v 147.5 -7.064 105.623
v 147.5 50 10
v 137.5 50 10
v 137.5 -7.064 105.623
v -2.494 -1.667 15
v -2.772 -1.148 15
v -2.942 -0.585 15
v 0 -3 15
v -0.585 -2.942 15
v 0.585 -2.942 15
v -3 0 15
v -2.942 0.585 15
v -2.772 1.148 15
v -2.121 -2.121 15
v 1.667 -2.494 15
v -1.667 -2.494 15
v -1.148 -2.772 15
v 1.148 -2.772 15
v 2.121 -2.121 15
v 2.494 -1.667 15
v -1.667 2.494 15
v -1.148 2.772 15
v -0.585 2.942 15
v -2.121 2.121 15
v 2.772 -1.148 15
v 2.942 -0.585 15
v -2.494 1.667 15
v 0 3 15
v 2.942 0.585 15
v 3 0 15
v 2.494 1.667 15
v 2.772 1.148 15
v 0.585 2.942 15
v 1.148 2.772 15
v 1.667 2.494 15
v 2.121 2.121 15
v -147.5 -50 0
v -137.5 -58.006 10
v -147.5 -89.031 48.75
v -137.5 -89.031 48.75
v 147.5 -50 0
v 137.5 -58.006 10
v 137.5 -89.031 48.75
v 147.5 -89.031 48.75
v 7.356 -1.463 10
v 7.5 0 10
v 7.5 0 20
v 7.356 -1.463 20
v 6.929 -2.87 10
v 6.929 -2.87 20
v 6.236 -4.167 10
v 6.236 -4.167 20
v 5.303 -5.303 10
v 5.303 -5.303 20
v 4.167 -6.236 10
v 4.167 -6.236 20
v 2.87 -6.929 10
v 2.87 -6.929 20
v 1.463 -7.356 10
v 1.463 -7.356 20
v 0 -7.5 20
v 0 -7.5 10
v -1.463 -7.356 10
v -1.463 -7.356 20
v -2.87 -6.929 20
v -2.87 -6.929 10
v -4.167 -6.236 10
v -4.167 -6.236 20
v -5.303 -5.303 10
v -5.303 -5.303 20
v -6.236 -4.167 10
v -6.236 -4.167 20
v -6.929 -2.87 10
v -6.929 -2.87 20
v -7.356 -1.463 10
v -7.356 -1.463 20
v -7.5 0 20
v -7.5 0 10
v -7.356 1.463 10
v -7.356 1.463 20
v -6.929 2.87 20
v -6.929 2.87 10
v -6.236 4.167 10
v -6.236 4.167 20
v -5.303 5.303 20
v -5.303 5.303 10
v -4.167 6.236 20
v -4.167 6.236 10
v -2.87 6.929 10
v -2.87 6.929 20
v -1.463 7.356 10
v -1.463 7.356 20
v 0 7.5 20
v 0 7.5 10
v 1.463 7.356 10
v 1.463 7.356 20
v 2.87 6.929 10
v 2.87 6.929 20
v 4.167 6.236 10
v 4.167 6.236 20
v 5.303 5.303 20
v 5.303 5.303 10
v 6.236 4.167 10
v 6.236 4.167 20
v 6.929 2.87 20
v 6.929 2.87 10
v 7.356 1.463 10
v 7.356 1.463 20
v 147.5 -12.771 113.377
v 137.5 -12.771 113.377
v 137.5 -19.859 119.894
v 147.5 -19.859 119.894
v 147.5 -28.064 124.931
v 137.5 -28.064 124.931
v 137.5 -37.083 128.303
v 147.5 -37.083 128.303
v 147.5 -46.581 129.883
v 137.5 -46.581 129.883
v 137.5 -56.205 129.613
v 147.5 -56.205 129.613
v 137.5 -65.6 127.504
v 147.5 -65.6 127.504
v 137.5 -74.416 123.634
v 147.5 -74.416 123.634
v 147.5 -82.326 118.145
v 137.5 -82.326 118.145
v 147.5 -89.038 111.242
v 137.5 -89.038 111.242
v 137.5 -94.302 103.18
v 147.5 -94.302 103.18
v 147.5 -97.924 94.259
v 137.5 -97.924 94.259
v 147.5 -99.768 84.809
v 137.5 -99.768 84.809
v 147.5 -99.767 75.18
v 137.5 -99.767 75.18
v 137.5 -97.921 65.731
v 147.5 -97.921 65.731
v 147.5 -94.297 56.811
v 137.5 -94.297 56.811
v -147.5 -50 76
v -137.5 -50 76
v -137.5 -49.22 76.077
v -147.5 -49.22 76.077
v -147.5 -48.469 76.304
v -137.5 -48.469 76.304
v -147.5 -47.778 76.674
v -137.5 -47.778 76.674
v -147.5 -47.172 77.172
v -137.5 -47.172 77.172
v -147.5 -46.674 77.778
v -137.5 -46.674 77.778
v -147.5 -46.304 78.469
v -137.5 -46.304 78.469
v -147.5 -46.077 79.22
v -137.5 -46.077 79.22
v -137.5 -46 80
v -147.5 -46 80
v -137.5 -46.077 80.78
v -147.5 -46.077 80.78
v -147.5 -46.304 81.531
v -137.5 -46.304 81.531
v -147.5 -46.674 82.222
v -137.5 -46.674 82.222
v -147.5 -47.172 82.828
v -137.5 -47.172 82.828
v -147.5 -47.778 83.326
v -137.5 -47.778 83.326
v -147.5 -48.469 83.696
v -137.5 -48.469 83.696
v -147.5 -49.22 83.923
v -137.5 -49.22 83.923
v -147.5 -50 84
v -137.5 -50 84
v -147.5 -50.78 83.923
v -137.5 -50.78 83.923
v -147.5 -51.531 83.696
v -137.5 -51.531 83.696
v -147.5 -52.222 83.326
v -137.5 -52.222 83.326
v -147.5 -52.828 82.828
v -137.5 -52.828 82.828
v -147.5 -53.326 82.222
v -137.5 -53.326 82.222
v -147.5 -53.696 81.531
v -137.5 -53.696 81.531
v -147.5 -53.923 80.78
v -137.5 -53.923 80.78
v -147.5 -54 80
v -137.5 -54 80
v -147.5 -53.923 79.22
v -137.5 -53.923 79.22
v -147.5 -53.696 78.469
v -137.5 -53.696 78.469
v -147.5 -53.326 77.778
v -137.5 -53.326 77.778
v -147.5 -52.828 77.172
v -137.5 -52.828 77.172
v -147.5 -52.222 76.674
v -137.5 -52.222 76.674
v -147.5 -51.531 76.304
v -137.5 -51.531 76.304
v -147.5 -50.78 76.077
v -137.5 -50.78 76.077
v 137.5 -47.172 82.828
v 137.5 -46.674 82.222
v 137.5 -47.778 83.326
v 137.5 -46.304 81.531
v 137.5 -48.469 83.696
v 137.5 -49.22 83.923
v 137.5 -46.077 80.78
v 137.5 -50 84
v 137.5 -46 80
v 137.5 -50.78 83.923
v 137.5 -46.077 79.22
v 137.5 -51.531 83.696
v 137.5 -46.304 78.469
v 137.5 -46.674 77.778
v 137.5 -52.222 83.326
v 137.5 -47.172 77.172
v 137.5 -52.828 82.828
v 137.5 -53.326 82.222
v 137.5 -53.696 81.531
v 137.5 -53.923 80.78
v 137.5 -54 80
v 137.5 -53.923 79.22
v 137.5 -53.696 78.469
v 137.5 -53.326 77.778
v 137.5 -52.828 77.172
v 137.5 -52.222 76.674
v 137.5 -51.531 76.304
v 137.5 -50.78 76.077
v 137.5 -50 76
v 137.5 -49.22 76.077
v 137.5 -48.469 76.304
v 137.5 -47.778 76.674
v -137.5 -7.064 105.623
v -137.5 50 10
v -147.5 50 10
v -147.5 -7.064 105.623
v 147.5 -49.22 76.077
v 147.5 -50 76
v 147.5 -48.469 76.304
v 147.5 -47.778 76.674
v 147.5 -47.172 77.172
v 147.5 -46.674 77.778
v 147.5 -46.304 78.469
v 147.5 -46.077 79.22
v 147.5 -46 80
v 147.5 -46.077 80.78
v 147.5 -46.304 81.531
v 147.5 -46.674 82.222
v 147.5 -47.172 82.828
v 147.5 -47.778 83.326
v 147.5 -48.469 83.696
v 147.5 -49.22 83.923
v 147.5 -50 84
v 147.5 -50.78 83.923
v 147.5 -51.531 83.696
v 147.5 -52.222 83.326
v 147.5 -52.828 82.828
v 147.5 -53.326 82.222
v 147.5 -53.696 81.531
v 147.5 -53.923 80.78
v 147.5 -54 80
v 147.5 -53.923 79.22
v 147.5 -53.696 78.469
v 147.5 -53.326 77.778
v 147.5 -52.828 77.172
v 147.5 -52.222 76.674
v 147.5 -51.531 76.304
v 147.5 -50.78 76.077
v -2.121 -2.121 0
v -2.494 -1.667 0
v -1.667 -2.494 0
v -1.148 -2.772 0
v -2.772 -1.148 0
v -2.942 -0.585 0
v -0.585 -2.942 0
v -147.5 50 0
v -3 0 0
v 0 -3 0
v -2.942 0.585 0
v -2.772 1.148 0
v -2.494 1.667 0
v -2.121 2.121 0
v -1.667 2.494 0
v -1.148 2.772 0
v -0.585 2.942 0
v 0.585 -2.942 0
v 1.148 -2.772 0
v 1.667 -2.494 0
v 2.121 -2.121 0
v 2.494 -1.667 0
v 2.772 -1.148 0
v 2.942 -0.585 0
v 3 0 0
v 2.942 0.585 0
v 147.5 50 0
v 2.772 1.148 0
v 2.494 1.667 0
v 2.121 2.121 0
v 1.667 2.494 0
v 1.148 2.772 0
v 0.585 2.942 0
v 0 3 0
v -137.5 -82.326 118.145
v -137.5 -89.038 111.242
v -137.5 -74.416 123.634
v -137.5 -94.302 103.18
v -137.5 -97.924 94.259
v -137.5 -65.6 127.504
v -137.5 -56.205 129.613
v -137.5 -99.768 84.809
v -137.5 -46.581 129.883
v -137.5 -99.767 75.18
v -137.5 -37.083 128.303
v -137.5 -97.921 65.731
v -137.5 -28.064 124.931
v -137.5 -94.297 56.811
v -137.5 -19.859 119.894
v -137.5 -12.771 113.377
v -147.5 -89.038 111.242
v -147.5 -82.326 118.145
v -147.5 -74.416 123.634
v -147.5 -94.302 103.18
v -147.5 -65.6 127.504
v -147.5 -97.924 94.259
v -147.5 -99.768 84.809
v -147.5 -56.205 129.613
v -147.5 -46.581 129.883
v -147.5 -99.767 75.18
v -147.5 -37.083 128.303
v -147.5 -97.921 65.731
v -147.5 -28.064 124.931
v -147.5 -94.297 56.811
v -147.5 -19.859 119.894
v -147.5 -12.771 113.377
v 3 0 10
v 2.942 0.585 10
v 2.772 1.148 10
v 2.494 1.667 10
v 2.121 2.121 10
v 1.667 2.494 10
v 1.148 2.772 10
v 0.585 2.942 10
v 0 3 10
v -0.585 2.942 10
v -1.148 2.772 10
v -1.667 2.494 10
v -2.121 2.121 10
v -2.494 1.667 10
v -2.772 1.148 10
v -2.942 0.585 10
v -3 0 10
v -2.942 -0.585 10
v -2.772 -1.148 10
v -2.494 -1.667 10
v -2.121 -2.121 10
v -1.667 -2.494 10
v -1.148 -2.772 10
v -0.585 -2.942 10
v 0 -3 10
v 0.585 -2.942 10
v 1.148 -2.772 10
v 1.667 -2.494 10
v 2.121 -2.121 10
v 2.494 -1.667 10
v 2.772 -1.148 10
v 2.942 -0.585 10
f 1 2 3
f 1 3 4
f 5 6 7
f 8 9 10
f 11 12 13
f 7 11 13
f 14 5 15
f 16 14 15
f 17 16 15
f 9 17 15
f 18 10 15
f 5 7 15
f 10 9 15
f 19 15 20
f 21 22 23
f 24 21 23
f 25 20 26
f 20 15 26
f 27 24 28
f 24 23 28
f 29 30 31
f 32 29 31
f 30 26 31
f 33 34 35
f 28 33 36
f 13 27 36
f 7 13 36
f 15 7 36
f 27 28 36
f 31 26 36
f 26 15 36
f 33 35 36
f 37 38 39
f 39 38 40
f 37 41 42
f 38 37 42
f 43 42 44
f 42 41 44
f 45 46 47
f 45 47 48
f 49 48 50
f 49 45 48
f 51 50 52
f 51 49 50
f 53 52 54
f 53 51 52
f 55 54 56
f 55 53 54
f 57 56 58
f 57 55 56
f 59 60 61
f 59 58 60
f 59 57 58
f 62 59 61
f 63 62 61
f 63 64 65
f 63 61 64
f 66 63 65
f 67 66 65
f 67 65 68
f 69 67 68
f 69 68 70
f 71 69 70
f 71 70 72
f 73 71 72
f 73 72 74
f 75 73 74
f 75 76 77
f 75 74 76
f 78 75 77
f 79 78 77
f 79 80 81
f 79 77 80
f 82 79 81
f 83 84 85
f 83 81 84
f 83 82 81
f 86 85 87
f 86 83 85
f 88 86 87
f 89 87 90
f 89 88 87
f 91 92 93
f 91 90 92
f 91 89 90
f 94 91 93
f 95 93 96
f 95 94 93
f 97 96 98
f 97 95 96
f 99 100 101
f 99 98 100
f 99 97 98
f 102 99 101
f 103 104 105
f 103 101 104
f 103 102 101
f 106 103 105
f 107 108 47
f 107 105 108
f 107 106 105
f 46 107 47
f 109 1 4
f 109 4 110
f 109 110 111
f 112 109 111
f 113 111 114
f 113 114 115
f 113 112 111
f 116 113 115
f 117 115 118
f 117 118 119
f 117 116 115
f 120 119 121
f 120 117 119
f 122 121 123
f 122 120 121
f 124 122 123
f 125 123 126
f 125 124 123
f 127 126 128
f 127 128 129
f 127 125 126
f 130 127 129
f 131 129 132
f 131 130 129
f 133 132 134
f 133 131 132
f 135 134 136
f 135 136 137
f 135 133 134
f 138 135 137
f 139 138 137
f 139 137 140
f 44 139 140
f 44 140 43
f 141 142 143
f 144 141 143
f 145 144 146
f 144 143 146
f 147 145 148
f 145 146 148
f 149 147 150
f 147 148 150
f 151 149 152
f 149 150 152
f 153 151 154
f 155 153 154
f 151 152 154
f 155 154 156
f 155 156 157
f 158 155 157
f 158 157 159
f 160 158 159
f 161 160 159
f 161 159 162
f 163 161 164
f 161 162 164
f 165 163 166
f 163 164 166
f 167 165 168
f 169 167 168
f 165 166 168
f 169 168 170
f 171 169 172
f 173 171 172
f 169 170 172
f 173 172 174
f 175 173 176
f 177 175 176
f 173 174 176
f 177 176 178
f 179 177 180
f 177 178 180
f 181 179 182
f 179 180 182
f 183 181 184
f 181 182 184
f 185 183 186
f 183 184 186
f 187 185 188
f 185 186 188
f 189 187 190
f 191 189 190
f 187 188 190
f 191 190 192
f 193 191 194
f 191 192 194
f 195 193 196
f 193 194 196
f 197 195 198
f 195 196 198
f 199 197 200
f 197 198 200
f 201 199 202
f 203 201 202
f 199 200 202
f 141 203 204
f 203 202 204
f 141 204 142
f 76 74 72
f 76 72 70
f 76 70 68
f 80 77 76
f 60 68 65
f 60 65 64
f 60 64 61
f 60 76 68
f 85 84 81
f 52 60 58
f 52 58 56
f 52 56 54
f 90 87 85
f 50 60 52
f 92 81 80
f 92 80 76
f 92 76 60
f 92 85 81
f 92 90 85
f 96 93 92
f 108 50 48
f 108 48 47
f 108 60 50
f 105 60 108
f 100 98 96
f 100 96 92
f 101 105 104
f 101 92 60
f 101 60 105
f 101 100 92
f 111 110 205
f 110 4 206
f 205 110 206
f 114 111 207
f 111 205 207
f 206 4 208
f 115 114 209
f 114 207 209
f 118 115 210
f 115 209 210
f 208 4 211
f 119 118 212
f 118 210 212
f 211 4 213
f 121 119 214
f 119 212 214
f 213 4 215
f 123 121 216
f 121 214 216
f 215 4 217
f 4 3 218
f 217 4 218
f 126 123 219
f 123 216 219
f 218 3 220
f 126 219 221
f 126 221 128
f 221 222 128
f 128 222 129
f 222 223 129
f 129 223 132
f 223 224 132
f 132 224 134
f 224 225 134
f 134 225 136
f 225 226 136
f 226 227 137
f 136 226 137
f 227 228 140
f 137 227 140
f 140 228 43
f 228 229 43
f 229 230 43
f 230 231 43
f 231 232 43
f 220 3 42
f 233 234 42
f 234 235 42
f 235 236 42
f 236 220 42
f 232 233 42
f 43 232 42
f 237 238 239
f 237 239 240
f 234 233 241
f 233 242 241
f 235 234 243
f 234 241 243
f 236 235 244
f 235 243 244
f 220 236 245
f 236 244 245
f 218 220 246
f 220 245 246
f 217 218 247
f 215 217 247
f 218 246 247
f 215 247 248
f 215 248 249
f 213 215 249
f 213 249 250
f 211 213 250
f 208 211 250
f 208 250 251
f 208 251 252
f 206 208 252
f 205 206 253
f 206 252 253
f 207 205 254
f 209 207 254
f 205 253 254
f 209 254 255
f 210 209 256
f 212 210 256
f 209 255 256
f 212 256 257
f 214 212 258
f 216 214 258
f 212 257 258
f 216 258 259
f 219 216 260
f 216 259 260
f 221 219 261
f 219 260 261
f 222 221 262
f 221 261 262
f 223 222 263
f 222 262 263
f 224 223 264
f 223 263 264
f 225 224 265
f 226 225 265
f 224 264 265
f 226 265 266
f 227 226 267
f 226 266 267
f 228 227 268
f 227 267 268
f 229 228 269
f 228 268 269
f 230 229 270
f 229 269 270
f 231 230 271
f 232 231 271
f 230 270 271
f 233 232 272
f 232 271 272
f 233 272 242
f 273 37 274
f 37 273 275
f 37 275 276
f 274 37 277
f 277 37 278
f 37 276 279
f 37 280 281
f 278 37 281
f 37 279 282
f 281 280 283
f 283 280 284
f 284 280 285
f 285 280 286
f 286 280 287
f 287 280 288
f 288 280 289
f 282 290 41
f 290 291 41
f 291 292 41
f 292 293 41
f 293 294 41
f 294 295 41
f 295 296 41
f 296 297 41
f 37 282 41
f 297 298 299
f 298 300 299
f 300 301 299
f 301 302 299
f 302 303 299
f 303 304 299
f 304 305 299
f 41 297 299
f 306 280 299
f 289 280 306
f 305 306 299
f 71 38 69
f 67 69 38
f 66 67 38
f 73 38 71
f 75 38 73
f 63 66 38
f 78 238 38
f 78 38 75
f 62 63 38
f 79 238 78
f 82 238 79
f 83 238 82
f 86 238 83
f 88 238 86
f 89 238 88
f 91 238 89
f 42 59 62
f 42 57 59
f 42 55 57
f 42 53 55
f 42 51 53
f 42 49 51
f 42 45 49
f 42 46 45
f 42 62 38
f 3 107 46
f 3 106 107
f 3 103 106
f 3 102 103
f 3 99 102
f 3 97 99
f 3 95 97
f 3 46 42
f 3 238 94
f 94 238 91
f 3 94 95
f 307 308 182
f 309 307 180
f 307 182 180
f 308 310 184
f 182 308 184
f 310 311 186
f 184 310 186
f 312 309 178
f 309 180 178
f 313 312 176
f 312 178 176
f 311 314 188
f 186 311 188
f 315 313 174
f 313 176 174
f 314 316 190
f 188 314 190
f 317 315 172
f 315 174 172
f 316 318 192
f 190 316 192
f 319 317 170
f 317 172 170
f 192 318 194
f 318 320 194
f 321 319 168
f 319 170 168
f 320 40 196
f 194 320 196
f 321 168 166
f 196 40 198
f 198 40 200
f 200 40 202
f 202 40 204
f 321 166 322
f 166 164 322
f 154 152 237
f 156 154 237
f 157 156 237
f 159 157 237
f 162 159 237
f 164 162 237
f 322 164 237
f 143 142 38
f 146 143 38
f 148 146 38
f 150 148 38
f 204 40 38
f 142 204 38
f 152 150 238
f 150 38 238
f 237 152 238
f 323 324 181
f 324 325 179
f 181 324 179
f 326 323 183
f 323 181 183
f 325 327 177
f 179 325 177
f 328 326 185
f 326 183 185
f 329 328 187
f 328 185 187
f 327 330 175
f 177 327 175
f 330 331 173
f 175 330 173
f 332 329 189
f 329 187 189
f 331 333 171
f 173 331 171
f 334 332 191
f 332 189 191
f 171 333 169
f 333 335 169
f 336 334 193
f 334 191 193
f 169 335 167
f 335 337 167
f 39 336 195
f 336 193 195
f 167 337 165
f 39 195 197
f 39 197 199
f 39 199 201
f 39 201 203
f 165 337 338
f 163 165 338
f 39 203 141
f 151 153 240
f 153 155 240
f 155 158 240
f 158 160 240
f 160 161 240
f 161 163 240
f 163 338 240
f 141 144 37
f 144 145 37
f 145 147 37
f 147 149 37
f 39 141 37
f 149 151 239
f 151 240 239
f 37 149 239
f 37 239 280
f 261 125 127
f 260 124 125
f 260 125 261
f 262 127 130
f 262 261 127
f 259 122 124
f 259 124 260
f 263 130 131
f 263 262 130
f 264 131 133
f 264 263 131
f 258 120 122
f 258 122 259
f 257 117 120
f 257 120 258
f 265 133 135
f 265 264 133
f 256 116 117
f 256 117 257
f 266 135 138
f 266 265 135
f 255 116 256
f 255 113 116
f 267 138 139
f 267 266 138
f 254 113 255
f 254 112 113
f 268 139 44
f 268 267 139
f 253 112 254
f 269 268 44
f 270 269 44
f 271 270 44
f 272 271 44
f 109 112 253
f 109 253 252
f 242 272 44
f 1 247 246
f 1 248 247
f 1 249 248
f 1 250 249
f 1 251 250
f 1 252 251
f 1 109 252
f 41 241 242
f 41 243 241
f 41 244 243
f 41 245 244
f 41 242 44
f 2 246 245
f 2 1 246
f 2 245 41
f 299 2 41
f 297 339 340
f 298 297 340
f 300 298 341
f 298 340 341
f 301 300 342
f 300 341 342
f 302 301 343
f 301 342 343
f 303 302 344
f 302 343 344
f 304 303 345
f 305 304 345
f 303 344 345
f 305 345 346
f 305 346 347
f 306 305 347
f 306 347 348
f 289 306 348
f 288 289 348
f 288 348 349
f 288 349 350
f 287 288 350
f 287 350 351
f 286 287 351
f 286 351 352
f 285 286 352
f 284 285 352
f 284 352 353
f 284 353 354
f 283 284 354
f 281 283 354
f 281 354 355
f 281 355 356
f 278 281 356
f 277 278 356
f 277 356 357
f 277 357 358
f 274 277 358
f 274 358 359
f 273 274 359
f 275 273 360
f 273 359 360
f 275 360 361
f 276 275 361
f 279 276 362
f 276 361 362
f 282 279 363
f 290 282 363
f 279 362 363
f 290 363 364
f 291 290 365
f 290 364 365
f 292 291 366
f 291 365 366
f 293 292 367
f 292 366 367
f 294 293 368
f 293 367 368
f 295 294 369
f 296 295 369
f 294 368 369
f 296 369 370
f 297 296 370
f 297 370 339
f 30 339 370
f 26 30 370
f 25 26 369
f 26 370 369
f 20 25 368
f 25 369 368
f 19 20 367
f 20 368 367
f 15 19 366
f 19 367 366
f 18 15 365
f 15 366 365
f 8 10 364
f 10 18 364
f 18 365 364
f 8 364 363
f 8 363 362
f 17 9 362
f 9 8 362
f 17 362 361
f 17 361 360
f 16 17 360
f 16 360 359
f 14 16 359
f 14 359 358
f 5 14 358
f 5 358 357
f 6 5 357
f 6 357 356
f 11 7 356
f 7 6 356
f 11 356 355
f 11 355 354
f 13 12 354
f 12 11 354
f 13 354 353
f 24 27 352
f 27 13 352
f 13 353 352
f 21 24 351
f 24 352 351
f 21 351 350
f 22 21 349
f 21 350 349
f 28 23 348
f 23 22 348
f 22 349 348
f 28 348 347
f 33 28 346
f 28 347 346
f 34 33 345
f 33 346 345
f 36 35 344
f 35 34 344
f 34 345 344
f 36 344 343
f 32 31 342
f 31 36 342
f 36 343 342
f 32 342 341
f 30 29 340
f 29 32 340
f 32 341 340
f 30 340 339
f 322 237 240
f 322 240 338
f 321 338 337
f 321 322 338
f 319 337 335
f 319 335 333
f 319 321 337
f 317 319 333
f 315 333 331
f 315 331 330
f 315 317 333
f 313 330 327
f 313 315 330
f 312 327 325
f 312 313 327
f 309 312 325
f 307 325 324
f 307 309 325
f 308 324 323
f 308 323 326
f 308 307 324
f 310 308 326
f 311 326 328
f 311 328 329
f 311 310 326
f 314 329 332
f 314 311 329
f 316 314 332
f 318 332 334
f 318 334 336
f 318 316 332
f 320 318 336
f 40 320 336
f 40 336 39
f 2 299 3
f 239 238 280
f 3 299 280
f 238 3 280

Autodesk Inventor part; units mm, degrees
ref_plane "YZ Plane" through (0, 0, 0) normal (1, 0, 0) x (0, 1, 0)
ref_plane "XZ Plane" through (0, 0, 0) normal (0, 1, 0) x (-1, 0, 0)
sketch "Sketch1" plane through (0, 0, 0) normal (0, 0, 1) x (1, 0, 0)
  line L0 (-147.5, -50) -> (147.5, -50)
  line L1 (147.5, -50) -> (147.5, 50)
  line L2 (147.5, 50) -> (-147.5, 50)
  line L3 (-147.5, 50) -> (-147.5, -50)
  line L4 (-147.5, -50) -> (147.5, 50) construction
  line L5 (147.5, -50) -> (-147.5, 50) construction
  point P0 (0, 0)
  dimension "d0" = 295
  dimension "d1" = 100
extrude "Extrusion1" add sketch "Sketch1" along normal blind 10
sketch "Sketch2" plane through (0, 0, 10) normal (0, 0, 1) x (1, 0, 0)
  circle A0 centre (0, 0) radius 3
  dimension "d13" = 6
extrude "Extrusion2" cut sketch "Sketch2" against normal through all
sketch "Sketch4" plane through (147.5, -50, 0) normal (1, 0, 0) x (0, 0, -1)
  circle A0 centre (-80, 0) radius 50 construction
  line L0 (0, 0) -> (-10, 0)
  line L1 (0, 0) -> (-48.75, -39.0312)
  line L2 (-10, 0) -> (-10, 100)
  line L3 (-10, 100) -> (-105.6226, 42.9358)
  arc A1 (-105.6226, 42.9358) -> (-48.75, -39.0312) centre (-80, 0) ccw
  line L4 (0, 0) -> (-10, 0)
  line L5 (-10, 100) -> (-10, 0)
  dimension "d8" = 100
  dimension "d20" = 80
extrude "Extrusion3" add sketch "Sketch4" against normal blind 295
ref_plane "Work Plane1" through (0, 0, 10) normal (0, 0, 1) x (1, 0, 0)
sketch "Sketch5" plane through (0, 0, 10) normal (0, 0, 1) x (1, 0, 0)
  line L0 (147.5, 50) -> (-147.5, 50) projected
  line L1 (147.5, -100) -> (-147.5, -100) projected
  line L2 (-137.5, 50) -> (137.5, 50)
  line L3 (137.5, 50) -> (137.5, -100)
  line L4 (137.5, -100) -> (-137.5, -100)
  line L5 (-137.5, -100) -> (-137.5, 50)
  line L6 (-147.5, 50) -> (-147.5, -50) projected
  line L7 (147.5, -50) -> (147.5, 50) projected
  point P0 (0, 0)
  dimension "d16" = 10
  dimension "d17" = 10
extrude "Extrusion4" cut sketch "Sketch5" along normal through all
sketch "Sketch7" plane through (0, 0, 10) normal (0, 0, 1) x (1, 0, 0)
  circle A0 centre (0, 0) radius 3 projected
  circle A1 centre (0, 0) radius 7.5
  dimension "d23" = 15
extrude "Extrusion6" add sketch "Sketch7" along normal blind 5
sketch "Sketch8" plane through (0, 0, 15) normal (0, 0, 1) x (1, 0, 0)
  circle A0 centre (0, 0) radius 7.5 projected
extrude "Extrusion7" add sketch "Sketch8" along normal blind 5
sketch "Sketch9" plane through (147.5, -50, 0) normal (1, 0, 0) x (0, 0, -1)
  arc A0 (-105.6226, 42.9358) -> (-48.75, -39.0312) centre (-80, 0) ccw projected
  circle A1 centre (-80, 0) radius 4
  point P0 (0, 50)
  dimension "d28" = 8
extrude "Extrusion8" cut sketch "Sketch9" against normal through all
properties part number "HA004"
